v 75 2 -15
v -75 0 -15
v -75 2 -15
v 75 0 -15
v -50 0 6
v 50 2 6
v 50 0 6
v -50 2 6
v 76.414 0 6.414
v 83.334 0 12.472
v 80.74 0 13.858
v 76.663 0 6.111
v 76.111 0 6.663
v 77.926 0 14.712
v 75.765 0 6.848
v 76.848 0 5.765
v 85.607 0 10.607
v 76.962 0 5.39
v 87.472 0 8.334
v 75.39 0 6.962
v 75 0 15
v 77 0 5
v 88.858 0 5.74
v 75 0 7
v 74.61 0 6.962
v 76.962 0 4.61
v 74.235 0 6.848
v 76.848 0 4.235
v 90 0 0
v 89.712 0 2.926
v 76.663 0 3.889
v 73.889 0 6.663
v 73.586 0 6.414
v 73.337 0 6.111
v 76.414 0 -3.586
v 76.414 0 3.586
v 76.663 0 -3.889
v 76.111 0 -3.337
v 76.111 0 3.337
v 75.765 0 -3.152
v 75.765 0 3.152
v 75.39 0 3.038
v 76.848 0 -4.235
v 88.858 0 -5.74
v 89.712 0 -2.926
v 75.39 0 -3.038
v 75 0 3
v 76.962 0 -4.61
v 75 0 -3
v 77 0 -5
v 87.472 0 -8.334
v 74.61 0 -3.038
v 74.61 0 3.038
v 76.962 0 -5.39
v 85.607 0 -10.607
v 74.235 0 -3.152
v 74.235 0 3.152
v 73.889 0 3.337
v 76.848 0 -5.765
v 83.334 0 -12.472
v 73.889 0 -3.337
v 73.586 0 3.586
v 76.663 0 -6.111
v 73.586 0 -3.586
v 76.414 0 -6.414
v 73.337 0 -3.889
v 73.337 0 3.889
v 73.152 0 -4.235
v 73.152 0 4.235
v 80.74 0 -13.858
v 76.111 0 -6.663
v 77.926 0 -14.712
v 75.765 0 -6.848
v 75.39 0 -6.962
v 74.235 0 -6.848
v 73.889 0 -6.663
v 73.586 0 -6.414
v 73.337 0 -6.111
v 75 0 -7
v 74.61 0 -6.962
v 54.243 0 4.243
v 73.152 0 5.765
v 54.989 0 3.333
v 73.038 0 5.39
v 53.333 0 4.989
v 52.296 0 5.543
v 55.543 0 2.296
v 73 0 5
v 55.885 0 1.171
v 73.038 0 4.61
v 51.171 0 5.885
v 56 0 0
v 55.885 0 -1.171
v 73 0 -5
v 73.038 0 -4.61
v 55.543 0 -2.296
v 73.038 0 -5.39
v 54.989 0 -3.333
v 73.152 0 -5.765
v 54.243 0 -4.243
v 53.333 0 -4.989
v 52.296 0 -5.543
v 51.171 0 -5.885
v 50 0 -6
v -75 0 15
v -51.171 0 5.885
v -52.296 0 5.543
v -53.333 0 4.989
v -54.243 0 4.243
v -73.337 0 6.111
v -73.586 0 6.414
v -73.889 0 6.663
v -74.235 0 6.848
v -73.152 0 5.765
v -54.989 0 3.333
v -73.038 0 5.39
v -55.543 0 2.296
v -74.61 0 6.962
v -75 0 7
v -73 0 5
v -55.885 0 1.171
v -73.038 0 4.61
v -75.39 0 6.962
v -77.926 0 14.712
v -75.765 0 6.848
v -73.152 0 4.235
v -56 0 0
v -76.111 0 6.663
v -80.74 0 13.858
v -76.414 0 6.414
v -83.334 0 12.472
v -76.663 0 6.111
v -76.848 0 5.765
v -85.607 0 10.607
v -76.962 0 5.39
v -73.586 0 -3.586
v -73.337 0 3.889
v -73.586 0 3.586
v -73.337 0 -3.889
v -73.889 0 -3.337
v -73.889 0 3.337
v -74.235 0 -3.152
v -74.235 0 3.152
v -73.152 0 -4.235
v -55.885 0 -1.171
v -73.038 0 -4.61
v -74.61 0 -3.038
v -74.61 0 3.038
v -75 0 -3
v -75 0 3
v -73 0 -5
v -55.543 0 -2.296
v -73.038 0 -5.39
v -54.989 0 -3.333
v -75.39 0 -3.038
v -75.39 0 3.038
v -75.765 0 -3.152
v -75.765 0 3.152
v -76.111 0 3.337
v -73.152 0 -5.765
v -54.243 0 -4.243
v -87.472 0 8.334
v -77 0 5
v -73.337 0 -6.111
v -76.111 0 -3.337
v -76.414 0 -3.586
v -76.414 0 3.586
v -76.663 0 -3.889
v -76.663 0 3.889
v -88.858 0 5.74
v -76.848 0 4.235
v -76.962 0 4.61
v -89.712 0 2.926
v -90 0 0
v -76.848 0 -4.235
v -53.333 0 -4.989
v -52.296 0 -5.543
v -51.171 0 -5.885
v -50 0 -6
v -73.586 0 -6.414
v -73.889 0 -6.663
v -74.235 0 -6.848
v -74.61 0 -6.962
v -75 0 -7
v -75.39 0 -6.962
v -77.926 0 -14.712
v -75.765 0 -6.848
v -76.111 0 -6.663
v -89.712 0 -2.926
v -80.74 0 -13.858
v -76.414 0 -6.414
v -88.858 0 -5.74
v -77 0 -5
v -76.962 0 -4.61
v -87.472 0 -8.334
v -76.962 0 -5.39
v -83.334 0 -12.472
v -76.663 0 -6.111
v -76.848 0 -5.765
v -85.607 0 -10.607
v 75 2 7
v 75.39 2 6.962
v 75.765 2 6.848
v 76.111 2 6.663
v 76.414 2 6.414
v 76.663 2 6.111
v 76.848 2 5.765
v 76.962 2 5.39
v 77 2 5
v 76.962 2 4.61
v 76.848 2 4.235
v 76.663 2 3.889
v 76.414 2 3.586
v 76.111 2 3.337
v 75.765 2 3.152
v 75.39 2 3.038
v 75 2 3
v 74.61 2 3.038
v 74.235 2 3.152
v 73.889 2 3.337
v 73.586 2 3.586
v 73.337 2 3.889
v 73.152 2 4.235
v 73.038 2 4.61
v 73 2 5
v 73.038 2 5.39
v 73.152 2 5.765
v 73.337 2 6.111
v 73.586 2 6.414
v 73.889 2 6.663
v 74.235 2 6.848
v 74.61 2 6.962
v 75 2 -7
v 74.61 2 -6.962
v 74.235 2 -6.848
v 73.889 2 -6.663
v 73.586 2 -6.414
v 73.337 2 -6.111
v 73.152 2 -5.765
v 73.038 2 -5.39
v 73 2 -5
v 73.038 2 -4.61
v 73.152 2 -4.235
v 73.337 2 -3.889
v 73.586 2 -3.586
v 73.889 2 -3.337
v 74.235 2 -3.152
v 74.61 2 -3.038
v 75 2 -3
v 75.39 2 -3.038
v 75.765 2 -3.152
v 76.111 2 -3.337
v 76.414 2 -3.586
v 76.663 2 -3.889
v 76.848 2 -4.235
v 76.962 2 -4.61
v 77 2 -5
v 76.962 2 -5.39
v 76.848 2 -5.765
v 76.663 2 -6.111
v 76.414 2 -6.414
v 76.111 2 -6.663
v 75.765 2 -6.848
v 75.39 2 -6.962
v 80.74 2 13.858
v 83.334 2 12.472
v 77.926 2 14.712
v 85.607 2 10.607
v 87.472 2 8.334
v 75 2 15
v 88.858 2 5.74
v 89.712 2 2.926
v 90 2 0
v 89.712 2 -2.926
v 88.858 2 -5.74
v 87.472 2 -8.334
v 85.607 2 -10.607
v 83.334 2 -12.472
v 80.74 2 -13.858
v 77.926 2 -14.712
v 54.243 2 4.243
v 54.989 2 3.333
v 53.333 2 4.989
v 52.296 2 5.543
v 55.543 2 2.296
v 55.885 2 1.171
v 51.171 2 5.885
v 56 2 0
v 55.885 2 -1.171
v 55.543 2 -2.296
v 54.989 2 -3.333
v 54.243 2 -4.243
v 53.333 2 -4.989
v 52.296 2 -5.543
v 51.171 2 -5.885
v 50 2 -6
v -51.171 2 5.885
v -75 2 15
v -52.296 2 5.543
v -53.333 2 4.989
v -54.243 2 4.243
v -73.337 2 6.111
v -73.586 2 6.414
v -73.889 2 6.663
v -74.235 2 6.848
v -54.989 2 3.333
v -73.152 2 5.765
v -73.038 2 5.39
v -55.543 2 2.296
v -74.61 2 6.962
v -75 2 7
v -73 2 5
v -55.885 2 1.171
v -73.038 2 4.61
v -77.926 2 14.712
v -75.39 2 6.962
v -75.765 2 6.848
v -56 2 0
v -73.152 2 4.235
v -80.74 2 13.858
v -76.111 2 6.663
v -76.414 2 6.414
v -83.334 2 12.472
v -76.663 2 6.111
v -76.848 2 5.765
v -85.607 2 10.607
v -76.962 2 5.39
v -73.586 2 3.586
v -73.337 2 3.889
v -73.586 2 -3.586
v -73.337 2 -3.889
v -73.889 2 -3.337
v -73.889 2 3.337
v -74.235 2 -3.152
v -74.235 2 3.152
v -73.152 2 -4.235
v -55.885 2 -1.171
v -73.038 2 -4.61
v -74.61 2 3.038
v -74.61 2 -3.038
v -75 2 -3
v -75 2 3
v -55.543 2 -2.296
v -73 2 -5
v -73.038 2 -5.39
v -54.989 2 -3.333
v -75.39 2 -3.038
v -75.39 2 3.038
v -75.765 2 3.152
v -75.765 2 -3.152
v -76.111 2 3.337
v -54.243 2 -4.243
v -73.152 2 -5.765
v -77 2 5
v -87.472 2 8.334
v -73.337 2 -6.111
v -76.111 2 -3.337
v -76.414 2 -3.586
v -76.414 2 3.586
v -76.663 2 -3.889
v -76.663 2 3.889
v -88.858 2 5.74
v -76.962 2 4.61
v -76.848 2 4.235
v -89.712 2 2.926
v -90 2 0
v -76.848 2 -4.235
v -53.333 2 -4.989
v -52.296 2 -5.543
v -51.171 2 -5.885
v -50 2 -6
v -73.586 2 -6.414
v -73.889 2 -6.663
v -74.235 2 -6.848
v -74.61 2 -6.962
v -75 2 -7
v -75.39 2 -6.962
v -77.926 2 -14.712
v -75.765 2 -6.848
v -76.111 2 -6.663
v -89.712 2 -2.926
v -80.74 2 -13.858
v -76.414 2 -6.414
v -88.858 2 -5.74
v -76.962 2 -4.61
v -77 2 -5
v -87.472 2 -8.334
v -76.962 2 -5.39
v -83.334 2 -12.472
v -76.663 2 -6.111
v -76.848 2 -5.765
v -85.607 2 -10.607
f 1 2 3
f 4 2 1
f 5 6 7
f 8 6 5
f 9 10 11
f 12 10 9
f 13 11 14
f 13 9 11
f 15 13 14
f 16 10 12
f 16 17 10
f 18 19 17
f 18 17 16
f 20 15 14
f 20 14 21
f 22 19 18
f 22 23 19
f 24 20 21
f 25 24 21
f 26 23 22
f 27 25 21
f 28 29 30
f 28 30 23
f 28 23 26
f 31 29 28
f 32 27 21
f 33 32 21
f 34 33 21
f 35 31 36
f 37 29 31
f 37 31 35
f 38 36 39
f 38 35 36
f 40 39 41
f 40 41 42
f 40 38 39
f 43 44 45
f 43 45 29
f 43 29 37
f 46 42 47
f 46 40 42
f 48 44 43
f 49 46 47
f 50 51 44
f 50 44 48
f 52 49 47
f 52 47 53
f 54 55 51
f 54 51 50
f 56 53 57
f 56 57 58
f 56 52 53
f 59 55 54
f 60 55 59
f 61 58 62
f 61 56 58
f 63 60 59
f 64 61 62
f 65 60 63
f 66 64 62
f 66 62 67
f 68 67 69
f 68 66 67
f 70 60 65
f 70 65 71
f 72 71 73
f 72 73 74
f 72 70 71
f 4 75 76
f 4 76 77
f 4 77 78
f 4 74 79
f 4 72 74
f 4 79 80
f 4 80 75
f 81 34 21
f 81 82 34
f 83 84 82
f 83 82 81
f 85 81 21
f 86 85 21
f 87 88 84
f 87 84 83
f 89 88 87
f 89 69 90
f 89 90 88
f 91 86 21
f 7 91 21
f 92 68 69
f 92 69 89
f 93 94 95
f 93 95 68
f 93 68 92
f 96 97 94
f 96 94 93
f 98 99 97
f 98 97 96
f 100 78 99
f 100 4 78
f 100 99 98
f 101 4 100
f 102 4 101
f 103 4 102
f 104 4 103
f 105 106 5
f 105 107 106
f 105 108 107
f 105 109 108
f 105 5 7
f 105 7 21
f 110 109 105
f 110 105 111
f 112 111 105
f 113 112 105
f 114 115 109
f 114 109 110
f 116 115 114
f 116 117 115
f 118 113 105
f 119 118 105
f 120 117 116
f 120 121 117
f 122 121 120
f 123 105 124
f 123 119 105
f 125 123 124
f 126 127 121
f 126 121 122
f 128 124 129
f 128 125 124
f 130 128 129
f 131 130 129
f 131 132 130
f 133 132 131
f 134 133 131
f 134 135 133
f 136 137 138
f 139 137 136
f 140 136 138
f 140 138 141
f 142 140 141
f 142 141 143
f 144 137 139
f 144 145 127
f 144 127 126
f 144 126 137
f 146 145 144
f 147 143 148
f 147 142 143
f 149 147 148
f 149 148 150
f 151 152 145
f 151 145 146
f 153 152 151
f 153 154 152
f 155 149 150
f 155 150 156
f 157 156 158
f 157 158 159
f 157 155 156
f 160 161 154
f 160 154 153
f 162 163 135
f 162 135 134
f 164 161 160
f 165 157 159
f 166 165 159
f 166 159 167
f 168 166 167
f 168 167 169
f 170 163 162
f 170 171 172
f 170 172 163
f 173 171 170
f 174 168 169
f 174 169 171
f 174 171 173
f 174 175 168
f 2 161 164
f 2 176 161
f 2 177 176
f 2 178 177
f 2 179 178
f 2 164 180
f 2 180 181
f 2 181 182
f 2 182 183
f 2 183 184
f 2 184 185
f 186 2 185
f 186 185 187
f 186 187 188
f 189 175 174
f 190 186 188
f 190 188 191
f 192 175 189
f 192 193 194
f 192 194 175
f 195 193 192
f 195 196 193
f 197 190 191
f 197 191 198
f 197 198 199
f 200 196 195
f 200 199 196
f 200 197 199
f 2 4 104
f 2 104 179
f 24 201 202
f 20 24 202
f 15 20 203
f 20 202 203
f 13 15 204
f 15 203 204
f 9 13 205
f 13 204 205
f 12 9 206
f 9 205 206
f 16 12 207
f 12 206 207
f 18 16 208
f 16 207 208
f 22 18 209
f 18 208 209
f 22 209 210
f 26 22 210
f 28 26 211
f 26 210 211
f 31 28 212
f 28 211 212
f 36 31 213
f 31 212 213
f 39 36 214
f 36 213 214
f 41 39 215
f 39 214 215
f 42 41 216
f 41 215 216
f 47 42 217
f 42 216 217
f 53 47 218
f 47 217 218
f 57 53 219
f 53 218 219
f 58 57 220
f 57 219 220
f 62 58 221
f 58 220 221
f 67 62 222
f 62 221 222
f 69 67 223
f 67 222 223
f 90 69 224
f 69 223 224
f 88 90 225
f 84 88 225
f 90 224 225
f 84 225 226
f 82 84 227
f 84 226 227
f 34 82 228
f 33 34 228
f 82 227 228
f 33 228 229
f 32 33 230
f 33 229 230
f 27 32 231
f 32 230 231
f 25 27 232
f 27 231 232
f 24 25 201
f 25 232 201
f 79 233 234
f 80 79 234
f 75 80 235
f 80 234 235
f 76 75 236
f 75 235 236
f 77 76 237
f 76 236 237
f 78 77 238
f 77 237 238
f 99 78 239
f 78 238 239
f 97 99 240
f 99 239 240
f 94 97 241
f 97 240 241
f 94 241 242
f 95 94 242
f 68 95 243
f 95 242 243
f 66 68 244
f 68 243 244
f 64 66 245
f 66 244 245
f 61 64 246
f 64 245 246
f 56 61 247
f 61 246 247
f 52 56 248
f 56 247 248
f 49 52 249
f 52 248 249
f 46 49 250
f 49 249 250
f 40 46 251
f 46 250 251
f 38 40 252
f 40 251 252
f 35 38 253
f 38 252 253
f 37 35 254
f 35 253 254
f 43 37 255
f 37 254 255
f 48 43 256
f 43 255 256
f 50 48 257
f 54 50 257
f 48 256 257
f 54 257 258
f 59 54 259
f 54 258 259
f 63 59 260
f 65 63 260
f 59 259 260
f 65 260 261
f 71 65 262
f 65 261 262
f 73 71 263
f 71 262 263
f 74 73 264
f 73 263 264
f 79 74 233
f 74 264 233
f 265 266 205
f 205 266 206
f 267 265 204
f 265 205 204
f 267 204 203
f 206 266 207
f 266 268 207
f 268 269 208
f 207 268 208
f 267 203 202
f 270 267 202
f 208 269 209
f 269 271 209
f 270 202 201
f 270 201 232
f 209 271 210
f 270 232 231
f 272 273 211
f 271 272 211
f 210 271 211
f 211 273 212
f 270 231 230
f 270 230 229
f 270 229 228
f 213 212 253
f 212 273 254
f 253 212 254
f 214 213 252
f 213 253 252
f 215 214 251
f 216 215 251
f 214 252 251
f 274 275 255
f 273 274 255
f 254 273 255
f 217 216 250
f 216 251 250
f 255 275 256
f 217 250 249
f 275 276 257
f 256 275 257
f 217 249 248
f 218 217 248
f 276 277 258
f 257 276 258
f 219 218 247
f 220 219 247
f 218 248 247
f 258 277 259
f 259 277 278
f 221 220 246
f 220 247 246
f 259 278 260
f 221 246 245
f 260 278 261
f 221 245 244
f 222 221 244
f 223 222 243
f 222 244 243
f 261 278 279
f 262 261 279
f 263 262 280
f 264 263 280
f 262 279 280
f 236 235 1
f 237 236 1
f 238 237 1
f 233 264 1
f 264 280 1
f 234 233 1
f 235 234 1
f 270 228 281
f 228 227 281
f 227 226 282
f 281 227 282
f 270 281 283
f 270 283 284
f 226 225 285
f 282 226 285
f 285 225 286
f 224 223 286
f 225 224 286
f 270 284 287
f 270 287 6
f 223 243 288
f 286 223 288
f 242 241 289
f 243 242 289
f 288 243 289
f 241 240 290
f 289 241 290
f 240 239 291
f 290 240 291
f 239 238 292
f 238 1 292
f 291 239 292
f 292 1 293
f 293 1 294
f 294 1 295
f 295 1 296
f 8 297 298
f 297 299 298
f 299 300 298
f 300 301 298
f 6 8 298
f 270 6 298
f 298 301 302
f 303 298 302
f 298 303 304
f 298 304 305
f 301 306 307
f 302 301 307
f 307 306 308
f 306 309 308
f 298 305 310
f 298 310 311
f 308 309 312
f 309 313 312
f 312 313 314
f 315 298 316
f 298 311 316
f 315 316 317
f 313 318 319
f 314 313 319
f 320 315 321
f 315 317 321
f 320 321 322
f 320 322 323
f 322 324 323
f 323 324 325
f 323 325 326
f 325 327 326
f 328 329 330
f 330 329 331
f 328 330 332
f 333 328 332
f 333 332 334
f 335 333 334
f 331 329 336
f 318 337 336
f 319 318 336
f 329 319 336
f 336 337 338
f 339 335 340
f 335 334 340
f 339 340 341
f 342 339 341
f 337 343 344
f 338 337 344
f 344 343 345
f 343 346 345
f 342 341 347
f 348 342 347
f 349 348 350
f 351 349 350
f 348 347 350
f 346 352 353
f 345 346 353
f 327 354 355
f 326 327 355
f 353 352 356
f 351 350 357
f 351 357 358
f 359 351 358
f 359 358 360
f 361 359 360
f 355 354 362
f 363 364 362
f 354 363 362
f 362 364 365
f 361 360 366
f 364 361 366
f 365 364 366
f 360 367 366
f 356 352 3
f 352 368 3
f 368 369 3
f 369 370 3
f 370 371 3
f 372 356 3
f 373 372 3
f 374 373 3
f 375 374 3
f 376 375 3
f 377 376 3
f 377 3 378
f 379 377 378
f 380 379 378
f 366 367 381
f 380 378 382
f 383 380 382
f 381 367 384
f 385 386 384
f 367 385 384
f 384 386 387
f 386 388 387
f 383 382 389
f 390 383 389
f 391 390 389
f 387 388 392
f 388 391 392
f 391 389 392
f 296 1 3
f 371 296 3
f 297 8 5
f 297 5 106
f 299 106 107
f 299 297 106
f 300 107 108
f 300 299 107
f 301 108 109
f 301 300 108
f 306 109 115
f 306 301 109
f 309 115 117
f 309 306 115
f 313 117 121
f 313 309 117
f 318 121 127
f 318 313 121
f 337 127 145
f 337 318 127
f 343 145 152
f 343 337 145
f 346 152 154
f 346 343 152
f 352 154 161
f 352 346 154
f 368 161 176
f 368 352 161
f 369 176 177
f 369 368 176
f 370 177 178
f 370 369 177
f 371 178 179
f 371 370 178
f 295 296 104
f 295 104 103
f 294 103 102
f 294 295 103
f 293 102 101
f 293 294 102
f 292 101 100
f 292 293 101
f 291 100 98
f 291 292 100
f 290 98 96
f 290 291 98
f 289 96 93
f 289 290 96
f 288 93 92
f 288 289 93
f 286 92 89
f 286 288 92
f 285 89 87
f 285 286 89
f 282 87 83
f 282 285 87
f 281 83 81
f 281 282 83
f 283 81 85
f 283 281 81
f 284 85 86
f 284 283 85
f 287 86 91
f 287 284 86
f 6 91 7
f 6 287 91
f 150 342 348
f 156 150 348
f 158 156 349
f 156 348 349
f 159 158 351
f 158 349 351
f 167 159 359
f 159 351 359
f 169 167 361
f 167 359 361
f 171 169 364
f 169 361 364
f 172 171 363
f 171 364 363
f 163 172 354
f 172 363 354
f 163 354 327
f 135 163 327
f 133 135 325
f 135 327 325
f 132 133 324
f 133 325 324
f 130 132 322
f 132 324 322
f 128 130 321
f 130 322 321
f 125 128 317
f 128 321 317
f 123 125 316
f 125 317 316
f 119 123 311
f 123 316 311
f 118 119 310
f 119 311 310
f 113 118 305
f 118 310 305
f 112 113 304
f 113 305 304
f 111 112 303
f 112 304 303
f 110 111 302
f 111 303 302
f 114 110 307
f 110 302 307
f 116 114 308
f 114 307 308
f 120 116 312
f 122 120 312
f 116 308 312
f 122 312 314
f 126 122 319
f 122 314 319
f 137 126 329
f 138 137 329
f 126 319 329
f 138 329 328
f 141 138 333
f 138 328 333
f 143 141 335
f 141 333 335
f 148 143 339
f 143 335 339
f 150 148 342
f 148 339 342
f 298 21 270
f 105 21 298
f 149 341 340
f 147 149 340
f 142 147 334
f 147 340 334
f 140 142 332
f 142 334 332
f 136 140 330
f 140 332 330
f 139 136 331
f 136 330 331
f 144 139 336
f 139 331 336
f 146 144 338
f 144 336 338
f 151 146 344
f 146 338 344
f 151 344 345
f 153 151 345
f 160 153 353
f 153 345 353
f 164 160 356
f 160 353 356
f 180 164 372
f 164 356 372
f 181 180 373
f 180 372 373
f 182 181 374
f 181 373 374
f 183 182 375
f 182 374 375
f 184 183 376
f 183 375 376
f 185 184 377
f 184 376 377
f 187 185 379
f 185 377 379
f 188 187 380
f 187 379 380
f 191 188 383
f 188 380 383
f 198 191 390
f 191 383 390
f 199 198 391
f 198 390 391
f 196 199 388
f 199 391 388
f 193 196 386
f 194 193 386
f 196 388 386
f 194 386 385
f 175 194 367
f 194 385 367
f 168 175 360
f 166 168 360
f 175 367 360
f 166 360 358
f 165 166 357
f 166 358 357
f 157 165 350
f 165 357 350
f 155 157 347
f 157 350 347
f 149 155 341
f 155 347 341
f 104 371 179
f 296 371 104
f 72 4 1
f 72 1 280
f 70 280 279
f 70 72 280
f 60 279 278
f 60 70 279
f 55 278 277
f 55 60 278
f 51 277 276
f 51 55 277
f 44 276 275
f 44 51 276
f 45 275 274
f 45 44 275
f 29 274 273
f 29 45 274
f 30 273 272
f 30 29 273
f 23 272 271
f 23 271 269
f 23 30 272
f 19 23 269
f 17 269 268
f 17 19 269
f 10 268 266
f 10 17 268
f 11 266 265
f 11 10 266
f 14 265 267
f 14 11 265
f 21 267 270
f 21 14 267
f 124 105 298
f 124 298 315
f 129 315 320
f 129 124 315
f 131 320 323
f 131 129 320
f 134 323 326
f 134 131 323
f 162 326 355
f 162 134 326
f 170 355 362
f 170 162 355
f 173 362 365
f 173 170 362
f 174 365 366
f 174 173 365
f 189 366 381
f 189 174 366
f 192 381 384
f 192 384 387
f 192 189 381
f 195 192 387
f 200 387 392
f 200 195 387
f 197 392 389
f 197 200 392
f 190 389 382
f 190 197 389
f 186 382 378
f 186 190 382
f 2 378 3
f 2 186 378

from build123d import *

# Parameters (mm, degrees)
EXTRUDE_1_DEPTH     = 2
SKETCH_2_R          = 2
CUT_EXTRUDE_1_DEPTH = 2


with BuildPart() as part:
    # 草图1 → 凸台-拉伸1 (new body)
    with BuildSketch(Plane(origin=(0, 0, 0), x_dir=(1, 0, 0), z_dir=(0, 1, 0))):
        with BuildLine():
            Line((-75, 15), (75, 15))
            ThreePointArc((75, 15), (90, 0), (75, -15))
            Line((75, -15), (-75, -15))
            ThreePointArc((-75, -15), (-90, 0), (-75, 15))
        make_face()
    extrude(amount=EXTRUDE_1_DEPTH)

    # 草图2 → 切除-拉伸1 (cut)
    with BuildSketch(Plane(origin=(0, 2, 0), x_dir=(1, 0, 0), z_dir=(0, 1, 0))):
        with Locations(Location((-75, 5, 0), (0, 0, 270))):
            Circle(SKETCH_2_R)
        with Locations(Location((-75, -5, 0), (0, 0, 90))):
            Circle(SKETCH_2_R)
        with Locations(Location((75, -5, 0), (0, 0, 270))):
            Circle(SKETCH_2_R)
        with Locations(Location((75, 5, 0), (0, 0, 90))):
            Circle(SKETCH_2_R)
        with BuildLine():
            Line((-50, 6), (50, 6))
            ThreePointArc((50, 6), (56, 0), (50, -6))
            Line((50, -6), (-50, -6))
            ThreePointArc((-50, -6), (-56, 0), (-50, 6))
        make_face()
    extrude(amount=-CUT_EXTRUDE_1_DEPTH, mode=Mode.SUBTRACT)


solid = part.part
